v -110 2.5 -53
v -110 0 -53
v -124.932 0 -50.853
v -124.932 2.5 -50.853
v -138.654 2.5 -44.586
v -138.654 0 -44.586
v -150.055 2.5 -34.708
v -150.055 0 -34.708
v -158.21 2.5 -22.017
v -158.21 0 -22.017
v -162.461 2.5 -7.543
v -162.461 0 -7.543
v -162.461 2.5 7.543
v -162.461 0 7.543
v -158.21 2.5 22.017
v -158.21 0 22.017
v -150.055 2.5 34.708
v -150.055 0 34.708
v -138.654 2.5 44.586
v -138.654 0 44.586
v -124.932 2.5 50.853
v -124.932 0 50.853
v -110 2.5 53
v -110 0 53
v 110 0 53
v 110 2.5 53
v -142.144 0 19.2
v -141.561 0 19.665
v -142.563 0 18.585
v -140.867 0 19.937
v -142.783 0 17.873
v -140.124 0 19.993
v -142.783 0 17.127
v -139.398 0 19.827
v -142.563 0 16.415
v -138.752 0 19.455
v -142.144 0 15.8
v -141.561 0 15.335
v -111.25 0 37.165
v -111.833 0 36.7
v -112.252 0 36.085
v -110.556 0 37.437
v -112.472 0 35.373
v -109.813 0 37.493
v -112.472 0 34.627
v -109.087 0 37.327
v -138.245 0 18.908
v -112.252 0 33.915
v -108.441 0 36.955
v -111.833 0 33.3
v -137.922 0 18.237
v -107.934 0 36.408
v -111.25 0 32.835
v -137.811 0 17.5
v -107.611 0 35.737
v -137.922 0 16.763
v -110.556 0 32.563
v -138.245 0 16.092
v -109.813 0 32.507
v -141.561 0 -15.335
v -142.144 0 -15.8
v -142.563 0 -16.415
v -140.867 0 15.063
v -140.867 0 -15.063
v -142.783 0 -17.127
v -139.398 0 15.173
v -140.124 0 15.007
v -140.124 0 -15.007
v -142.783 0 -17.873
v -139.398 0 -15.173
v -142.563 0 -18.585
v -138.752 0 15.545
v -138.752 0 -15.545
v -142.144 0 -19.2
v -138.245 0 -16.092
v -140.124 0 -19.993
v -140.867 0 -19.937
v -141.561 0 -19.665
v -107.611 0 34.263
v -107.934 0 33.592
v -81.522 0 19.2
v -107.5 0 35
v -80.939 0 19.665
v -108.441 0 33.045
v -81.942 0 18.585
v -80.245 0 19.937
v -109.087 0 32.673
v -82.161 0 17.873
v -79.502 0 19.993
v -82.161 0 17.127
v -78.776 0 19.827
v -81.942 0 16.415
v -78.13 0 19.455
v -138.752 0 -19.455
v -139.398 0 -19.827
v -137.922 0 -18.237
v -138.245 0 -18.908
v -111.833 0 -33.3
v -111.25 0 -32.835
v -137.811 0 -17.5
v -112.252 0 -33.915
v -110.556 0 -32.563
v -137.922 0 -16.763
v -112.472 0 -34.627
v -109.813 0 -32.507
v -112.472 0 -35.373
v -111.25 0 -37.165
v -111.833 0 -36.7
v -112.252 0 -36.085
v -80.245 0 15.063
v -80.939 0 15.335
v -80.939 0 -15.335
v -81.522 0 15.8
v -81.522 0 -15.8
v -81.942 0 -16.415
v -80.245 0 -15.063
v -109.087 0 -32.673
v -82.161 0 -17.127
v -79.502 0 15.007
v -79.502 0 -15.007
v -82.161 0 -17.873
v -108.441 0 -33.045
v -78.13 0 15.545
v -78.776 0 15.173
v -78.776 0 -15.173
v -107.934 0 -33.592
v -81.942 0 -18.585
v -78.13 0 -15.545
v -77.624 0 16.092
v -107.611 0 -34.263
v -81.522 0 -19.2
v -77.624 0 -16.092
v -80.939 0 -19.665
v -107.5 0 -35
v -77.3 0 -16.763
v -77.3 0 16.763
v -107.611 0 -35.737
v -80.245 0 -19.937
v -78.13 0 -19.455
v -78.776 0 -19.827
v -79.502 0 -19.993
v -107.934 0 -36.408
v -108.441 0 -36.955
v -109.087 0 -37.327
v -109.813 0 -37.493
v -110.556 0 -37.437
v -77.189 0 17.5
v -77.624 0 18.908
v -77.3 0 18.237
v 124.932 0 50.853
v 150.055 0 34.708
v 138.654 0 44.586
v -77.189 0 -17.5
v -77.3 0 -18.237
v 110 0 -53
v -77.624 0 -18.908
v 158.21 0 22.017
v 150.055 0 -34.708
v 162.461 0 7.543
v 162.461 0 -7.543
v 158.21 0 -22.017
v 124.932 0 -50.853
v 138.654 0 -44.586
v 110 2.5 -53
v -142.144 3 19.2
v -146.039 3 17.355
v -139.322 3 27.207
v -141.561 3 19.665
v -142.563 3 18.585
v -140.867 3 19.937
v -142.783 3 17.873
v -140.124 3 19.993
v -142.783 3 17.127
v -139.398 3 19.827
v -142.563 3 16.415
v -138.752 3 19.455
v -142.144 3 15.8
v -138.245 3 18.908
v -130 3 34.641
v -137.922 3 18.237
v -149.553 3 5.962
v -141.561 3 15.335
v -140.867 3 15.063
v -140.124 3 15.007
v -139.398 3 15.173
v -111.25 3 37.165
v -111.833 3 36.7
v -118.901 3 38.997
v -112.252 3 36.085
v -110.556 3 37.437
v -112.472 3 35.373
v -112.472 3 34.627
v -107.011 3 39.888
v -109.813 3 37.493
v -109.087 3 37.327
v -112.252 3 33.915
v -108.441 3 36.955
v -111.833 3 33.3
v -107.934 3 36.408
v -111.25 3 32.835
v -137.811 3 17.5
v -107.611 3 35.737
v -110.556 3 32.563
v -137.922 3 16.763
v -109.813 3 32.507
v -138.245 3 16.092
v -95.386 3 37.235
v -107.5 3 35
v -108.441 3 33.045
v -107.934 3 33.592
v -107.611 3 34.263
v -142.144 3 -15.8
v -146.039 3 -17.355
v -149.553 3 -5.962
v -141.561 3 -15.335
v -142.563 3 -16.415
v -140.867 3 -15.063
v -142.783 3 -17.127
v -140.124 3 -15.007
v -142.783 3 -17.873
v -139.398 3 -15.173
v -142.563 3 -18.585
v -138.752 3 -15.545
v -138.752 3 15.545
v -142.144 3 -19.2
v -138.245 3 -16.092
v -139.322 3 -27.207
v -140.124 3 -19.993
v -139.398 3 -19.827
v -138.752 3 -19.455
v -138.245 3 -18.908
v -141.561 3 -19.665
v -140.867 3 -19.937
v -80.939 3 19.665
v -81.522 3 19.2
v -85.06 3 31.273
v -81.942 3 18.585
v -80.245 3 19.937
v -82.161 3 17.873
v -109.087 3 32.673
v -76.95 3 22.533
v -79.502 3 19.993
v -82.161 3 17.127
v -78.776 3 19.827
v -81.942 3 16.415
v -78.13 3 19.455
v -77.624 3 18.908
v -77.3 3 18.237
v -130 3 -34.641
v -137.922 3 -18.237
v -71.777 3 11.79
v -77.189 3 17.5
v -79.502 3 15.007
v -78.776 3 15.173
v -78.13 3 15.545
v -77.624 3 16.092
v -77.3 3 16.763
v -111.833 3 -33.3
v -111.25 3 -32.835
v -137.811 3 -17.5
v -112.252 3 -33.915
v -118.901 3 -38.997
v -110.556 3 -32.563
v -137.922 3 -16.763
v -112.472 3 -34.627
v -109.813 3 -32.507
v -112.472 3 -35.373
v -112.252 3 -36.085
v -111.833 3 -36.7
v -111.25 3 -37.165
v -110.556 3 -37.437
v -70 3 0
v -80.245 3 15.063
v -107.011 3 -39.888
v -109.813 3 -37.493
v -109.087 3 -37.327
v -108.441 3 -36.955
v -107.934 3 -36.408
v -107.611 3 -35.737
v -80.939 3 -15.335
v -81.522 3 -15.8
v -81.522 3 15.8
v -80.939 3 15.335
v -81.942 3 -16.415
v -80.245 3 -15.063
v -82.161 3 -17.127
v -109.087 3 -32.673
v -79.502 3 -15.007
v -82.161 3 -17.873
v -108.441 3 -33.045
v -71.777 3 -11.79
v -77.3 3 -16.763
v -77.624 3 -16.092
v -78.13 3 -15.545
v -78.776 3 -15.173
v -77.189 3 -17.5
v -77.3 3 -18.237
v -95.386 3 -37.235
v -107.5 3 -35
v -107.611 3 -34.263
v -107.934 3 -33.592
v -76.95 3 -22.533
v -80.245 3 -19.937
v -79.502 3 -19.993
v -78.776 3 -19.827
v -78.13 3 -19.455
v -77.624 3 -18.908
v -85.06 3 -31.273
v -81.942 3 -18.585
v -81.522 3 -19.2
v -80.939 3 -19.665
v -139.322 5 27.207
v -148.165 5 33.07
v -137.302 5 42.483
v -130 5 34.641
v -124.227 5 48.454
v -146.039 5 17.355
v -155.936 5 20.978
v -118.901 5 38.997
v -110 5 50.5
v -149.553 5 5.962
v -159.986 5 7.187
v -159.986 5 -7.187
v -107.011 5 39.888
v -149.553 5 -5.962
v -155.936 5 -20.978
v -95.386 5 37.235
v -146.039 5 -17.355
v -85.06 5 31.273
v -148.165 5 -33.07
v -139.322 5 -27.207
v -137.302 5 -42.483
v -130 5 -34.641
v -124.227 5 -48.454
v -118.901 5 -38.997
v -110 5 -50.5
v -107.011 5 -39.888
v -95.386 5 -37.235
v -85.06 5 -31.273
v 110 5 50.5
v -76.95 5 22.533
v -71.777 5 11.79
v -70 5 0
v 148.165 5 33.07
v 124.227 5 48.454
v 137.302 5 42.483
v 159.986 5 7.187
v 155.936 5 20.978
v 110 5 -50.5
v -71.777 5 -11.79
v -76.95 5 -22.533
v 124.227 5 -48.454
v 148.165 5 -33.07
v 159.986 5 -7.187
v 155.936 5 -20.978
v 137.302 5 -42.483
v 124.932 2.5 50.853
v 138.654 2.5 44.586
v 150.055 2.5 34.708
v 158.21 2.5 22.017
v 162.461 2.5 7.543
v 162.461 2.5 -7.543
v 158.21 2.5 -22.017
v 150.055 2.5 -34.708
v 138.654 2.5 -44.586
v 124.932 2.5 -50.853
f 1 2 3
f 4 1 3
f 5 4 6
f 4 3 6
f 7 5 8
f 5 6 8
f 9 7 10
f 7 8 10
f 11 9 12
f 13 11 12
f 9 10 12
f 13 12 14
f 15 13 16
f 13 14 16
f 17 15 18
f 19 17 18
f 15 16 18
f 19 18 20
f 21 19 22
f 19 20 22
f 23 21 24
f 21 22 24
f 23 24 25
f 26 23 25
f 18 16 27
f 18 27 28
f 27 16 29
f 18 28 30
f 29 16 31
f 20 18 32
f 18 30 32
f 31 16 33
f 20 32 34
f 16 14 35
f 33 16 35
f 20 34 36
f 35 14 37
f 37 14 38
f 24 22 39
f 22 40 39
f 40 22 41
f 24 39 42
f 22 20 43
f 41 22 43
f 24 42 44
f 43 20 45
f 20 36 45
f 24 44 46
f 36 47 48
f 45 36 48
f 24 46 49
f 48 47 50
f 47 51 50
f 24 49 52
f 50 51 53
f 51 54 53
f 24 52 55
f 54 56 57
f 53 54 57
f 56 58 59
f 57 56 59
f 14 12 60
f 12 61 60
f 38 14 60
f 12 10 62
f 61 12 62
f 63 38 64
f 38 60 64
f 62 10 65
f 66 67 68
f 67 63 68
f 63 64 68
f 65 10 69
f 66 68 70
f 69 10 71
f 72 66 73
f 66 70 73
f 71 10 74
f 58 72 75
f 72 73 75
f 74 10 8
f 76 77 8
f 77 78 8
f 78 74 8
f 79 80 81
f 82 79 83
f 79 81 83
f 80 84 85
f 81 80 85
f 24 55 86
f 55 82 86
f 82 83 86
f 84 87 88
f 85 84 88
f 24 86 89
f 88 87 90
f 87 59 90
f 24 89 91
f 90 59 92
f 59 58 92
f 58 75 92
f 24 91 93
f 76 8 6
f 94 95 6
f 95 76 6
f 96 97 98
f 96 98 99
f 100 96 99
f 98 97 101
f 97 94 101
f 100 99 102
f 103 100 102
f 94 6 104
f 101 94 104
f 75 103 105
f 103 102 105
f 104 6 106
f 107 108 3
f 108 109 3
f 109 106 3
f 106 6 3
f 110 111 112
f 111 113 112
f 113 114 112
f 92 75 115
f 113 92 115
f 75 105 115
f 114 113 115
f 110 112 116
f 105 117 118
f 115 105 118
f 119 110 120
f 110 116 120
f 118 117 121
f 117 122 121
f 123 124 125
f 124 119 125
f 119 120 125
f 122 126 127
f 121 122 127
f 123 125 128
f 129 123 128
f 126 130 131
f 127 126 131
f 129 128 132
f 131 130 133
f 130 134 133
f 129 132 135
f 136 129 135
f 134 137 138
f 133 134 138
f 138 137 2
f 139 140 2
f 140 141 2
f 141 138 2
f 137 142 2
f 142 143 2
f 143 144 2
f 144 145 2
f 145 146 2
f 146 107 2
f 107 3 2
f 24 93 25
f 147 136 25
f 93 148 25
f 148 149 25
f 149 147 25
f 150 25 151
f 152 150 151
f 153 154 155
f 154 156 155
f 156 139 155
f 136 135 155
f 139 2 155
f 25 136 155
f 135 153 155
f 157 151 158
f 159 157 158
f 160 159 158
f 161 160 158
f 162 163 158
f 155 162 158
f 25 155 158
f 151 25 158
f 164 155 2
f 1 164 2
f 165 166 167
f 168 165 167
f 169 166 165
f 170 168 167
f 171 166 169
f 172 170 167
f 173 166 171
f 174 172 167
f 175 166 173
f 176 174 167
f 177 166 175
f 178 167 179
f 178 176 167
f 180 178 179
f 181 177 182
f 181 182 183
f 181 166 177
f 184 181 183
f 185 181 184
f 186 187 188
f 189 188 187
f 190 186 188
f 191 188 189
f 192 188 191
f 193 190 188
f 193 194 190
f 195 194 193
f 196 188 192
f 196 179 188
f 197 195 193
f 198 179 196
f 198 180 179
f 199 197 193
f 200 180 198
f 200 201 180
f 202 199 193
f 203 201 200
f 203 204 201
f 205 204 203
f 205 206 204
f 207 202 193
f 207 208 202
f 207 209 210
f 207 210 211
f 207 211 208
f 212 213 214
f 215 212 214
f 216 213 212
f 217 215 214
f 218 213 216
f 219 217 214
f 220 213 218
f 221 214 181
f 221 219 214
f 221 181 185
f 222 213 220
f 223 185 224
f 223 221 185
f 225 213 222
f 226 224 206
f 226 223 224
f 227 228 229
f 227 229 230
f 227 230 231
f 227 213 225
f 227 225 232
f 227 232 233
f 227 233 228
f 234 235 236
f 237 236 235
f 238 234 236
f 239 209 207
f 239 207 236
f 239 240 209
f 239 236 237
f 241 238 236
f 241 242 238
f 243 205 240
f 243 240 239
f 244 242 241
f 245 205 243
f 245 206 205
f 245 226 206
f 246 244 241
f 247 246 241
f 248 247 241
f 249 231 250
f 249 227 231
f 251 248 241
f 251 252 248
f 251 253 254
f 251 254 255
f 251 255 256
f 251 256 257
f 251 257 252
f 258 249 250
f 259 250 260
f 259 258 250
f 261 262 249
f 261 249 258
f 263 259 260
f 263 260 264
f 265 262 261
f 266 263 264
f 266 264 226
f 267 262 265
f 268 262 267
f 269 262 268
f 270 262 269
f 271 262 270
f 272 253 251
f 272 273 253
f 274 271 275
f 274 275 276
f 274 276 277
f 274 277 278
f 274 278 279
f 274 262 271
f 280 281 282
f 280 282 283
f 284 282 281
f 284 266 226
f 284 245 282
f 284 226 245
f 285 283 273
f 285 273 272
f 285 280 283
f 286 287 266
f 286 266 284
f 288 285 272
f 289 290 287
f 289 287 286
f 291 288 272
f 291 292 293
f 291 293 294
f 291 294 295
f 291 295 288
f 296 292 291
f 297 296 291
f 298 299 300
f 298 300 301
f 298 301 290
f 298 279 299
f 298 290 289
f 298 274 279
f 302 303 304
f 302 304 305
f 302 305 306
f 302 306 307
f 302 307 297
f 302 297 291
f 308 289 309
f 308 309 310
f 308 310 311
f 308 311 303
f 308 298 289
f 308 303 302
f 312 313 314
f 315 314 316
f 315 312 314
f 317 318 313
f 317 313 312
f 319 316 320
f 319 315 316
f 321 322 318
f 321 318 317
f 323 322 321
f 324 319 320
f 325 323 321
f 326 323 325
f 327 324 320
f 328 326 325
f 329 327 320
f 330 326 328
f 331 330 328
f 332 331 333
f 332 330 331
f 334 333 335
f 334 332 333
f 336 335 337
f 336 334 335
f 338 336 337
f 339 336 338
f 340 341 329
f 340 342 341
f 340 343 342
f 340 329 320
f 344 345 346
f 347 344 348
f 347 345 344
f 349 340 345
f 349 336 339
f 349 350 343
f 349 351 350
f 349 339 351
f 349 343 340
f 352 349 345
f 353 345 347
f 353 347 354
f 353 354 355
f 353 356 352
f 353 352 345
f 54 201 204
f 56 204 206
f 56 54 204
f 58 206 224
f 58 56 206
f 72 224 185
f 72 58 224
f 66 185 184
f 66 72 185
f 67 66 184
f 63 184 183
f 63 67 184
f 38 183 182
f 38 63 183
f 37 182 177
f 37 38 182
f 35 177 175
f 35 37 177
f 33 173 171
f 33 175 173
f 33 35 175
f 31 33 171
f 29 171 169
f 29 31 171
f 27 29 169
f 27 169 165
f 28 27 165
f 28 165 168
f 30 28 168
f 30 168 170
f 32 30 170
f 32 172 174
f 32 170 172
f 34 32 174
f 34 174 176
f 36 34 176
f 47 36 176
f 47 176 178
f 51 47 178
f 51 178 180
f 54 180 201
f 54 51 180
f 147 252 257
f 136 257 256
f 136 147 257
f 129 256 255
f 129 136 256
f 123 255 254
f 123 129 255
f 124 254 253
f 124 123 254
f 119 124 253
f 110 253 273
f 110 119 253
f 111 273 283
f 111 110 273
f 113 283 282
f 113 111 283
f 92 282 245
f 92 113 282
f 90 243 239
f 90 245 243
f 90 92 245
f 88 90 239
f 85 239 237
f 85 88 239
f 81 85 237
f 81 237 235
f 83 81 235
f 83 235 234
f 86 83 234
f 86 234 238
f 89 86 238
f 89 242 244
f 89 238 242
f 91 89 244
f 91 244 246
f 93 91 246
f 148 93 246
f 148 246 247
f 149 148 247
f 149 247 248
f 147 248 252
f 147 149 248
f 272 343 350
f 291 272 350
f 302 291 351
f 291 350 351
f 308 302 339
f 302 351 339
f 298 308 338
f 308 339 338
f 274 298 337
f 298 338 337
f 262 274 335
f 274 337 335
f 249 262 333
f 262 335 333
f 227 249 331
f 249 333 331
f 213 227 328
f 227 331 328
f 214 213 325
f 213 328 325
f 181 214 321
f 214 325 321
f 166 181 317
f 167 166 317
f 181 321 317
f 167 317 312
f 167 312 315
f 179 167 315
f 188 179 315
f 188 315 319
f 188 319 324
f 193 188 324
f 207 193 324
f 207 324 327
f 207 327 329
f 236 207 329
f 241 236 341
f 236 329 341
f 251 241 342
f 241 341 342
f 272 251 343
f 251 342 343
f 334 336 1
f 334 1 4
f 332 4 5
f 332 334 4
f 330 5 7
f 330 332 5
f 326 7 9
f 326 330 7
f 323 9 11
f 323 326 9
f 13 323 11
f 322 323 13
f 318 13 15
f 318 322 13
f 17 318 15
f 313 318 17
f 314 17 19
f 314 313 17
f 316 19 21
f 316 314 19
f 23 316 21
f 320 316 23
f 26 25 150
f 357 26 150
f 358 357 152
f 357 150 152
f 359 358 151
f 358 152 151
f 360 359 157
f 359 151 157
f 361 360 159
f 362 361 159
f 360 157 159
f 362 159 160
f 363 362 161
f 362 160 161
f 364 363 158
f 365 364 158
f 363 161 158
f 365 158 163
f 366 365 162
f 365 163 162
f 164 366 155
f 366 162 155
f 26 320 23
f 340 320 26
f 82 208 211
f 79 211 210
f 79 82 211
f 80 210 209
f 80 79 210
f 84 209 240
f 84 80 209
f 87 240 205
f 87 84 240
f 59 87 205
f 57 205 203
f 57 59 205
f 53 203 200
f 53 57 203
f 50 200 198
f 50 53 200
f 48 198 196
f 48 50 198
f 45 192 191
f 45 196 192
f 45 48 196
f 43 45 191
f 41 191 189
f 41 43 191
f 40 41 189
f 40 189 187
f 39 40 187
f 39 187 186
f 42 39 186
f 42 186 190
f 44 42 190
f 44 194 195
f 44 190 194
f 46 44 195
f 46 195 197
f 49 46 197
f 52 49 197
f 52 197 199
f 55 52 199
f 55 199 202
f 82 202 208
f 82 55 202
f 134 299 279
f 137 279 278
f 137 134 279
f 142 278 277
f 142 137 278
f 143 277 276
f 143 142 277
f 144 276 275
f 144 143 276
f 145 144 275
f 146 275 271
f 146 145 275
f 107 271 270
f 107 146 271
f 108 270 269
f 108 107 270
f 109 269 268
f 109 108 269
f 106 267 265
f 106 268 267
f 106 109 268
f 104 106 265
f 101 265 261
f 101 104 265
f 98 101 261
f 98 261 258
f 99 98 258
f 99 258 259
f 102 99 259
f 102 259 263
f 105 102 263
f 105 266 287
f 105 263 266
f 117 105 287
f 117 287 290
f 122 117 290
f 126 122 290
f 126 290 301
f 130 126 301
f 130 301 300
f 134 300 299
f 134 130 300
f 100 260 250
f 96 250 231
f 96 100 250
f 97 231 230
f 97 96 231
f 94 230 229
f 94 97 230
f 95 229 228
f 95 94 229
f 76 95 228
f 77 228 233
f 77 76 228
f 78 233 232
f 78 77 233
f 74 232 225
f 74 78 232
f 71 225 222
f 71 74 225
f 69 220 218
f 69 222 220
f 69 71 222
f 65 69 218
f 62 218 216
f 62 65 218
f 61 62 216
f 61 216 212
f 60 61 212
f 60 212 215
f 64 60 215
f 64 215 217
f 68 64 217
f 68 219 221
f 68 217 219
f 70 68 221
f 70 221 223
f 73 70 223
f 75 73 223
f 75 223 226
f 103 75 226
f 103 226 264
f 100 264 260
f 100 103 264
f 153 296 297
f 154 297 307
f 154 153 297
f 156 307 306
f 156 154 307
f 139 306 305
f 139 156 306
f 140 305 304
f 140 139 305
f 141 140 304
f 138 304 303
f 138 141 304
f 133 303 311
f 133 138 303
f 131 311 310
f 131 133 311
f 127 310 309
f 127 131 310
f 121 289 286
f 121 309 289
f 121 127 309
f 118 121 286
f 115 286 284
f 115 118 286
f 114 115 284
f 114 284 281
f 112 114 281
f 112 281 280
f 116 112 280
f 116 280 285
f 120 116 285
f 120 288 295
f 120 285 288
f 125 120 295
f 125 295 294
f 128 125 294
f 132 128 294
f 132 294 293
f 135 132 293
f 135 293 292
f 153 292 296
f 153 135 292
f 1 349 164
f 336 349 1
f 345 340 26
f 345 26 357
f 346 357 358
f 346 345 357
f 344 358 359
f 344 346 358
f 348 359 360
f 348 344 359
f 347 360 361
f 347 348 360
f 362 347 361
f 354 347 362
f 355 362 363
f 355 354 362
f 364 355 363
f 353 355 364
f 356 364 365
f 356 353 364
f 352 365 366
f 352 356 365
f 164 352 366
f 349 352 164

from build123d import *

# Parameters (mm, degrees)
SKETCH1_R           = 2.5
BOSS_EXTRUDE1_DEPTH = 5
SKETCH2_R           = 40
CUT_EXTRUDE1_DEPTH  = 2
CHAMFER1_SIZE       = 2.5


with BuildPart() as part:
    # Sketch1 → Boss-Extrude1 (new body)
    with BuildSketch(Plane(origin=(0, 0, 0), x_dir=(1, 0, 0), z_dir=(0, 1, 0))):
        with BuildLine():
            Line((-110, -53), (110, -53))
            ThreePointArc((110, -53), (163, 0), (110, 53))
            Line((110, 53), (-110, 53))
            ThreePointArc((-110, 53), (-163, 0), (-110, -53))
        make_face()
        with Locations((-110, -35)):
            Circle(SKETCH1_R, mode=Mode.SUBTRACT)
        with Locations((-110, 35)):
            Circle(SKETCH1_R, mode=Mode.SUBTRACT)
        with Locations((-79.689110868, 17.5)):
            Circle(SKETCH1_R, mode=Mode.SUBTRACT)
        with Locations((-79.689110868, -17.5)):
            Circle(SKETCH1_R, mode=Mode.SUBTRACT)
        with Locations((-140.310889132, 17.5)):
            Circle(SKETCH1_R, mode=Mode.SUBTRACT)
        with Locations((-140.310889132, -17.5)):
            Circle(SKETCH1_R, mode=Mode.SUBTRACT)
    extrude(amount=BOSS_EXTRUDE1_DEPTH)

    # Sketch2 → Cut-Extrude1 (cut)
    with BuildSketch(Plane(origin=(0, 5, 0), x_dir=(1, 0, 0), z_dir=(0, 1, 0))):
        with Locations((-110, 0)):
            Circle(SKETCH2_R)
    extrude(amount=-CUT_EXTRUDE1_DEPTH, mode=Mode.SUBTRACT)

    # Chamfer1
    chamfer1_edges = [part.edges().sort_by_distance(p)[0] for p in [
        (-163, 5, 0),
        (0, 5, 53),
        (163, 5, 0),
        (0, 5, -53),
    ]]
    chamfer(chamfer1_edges, length=CHAMFER1_SIZE)


solid = part.part
